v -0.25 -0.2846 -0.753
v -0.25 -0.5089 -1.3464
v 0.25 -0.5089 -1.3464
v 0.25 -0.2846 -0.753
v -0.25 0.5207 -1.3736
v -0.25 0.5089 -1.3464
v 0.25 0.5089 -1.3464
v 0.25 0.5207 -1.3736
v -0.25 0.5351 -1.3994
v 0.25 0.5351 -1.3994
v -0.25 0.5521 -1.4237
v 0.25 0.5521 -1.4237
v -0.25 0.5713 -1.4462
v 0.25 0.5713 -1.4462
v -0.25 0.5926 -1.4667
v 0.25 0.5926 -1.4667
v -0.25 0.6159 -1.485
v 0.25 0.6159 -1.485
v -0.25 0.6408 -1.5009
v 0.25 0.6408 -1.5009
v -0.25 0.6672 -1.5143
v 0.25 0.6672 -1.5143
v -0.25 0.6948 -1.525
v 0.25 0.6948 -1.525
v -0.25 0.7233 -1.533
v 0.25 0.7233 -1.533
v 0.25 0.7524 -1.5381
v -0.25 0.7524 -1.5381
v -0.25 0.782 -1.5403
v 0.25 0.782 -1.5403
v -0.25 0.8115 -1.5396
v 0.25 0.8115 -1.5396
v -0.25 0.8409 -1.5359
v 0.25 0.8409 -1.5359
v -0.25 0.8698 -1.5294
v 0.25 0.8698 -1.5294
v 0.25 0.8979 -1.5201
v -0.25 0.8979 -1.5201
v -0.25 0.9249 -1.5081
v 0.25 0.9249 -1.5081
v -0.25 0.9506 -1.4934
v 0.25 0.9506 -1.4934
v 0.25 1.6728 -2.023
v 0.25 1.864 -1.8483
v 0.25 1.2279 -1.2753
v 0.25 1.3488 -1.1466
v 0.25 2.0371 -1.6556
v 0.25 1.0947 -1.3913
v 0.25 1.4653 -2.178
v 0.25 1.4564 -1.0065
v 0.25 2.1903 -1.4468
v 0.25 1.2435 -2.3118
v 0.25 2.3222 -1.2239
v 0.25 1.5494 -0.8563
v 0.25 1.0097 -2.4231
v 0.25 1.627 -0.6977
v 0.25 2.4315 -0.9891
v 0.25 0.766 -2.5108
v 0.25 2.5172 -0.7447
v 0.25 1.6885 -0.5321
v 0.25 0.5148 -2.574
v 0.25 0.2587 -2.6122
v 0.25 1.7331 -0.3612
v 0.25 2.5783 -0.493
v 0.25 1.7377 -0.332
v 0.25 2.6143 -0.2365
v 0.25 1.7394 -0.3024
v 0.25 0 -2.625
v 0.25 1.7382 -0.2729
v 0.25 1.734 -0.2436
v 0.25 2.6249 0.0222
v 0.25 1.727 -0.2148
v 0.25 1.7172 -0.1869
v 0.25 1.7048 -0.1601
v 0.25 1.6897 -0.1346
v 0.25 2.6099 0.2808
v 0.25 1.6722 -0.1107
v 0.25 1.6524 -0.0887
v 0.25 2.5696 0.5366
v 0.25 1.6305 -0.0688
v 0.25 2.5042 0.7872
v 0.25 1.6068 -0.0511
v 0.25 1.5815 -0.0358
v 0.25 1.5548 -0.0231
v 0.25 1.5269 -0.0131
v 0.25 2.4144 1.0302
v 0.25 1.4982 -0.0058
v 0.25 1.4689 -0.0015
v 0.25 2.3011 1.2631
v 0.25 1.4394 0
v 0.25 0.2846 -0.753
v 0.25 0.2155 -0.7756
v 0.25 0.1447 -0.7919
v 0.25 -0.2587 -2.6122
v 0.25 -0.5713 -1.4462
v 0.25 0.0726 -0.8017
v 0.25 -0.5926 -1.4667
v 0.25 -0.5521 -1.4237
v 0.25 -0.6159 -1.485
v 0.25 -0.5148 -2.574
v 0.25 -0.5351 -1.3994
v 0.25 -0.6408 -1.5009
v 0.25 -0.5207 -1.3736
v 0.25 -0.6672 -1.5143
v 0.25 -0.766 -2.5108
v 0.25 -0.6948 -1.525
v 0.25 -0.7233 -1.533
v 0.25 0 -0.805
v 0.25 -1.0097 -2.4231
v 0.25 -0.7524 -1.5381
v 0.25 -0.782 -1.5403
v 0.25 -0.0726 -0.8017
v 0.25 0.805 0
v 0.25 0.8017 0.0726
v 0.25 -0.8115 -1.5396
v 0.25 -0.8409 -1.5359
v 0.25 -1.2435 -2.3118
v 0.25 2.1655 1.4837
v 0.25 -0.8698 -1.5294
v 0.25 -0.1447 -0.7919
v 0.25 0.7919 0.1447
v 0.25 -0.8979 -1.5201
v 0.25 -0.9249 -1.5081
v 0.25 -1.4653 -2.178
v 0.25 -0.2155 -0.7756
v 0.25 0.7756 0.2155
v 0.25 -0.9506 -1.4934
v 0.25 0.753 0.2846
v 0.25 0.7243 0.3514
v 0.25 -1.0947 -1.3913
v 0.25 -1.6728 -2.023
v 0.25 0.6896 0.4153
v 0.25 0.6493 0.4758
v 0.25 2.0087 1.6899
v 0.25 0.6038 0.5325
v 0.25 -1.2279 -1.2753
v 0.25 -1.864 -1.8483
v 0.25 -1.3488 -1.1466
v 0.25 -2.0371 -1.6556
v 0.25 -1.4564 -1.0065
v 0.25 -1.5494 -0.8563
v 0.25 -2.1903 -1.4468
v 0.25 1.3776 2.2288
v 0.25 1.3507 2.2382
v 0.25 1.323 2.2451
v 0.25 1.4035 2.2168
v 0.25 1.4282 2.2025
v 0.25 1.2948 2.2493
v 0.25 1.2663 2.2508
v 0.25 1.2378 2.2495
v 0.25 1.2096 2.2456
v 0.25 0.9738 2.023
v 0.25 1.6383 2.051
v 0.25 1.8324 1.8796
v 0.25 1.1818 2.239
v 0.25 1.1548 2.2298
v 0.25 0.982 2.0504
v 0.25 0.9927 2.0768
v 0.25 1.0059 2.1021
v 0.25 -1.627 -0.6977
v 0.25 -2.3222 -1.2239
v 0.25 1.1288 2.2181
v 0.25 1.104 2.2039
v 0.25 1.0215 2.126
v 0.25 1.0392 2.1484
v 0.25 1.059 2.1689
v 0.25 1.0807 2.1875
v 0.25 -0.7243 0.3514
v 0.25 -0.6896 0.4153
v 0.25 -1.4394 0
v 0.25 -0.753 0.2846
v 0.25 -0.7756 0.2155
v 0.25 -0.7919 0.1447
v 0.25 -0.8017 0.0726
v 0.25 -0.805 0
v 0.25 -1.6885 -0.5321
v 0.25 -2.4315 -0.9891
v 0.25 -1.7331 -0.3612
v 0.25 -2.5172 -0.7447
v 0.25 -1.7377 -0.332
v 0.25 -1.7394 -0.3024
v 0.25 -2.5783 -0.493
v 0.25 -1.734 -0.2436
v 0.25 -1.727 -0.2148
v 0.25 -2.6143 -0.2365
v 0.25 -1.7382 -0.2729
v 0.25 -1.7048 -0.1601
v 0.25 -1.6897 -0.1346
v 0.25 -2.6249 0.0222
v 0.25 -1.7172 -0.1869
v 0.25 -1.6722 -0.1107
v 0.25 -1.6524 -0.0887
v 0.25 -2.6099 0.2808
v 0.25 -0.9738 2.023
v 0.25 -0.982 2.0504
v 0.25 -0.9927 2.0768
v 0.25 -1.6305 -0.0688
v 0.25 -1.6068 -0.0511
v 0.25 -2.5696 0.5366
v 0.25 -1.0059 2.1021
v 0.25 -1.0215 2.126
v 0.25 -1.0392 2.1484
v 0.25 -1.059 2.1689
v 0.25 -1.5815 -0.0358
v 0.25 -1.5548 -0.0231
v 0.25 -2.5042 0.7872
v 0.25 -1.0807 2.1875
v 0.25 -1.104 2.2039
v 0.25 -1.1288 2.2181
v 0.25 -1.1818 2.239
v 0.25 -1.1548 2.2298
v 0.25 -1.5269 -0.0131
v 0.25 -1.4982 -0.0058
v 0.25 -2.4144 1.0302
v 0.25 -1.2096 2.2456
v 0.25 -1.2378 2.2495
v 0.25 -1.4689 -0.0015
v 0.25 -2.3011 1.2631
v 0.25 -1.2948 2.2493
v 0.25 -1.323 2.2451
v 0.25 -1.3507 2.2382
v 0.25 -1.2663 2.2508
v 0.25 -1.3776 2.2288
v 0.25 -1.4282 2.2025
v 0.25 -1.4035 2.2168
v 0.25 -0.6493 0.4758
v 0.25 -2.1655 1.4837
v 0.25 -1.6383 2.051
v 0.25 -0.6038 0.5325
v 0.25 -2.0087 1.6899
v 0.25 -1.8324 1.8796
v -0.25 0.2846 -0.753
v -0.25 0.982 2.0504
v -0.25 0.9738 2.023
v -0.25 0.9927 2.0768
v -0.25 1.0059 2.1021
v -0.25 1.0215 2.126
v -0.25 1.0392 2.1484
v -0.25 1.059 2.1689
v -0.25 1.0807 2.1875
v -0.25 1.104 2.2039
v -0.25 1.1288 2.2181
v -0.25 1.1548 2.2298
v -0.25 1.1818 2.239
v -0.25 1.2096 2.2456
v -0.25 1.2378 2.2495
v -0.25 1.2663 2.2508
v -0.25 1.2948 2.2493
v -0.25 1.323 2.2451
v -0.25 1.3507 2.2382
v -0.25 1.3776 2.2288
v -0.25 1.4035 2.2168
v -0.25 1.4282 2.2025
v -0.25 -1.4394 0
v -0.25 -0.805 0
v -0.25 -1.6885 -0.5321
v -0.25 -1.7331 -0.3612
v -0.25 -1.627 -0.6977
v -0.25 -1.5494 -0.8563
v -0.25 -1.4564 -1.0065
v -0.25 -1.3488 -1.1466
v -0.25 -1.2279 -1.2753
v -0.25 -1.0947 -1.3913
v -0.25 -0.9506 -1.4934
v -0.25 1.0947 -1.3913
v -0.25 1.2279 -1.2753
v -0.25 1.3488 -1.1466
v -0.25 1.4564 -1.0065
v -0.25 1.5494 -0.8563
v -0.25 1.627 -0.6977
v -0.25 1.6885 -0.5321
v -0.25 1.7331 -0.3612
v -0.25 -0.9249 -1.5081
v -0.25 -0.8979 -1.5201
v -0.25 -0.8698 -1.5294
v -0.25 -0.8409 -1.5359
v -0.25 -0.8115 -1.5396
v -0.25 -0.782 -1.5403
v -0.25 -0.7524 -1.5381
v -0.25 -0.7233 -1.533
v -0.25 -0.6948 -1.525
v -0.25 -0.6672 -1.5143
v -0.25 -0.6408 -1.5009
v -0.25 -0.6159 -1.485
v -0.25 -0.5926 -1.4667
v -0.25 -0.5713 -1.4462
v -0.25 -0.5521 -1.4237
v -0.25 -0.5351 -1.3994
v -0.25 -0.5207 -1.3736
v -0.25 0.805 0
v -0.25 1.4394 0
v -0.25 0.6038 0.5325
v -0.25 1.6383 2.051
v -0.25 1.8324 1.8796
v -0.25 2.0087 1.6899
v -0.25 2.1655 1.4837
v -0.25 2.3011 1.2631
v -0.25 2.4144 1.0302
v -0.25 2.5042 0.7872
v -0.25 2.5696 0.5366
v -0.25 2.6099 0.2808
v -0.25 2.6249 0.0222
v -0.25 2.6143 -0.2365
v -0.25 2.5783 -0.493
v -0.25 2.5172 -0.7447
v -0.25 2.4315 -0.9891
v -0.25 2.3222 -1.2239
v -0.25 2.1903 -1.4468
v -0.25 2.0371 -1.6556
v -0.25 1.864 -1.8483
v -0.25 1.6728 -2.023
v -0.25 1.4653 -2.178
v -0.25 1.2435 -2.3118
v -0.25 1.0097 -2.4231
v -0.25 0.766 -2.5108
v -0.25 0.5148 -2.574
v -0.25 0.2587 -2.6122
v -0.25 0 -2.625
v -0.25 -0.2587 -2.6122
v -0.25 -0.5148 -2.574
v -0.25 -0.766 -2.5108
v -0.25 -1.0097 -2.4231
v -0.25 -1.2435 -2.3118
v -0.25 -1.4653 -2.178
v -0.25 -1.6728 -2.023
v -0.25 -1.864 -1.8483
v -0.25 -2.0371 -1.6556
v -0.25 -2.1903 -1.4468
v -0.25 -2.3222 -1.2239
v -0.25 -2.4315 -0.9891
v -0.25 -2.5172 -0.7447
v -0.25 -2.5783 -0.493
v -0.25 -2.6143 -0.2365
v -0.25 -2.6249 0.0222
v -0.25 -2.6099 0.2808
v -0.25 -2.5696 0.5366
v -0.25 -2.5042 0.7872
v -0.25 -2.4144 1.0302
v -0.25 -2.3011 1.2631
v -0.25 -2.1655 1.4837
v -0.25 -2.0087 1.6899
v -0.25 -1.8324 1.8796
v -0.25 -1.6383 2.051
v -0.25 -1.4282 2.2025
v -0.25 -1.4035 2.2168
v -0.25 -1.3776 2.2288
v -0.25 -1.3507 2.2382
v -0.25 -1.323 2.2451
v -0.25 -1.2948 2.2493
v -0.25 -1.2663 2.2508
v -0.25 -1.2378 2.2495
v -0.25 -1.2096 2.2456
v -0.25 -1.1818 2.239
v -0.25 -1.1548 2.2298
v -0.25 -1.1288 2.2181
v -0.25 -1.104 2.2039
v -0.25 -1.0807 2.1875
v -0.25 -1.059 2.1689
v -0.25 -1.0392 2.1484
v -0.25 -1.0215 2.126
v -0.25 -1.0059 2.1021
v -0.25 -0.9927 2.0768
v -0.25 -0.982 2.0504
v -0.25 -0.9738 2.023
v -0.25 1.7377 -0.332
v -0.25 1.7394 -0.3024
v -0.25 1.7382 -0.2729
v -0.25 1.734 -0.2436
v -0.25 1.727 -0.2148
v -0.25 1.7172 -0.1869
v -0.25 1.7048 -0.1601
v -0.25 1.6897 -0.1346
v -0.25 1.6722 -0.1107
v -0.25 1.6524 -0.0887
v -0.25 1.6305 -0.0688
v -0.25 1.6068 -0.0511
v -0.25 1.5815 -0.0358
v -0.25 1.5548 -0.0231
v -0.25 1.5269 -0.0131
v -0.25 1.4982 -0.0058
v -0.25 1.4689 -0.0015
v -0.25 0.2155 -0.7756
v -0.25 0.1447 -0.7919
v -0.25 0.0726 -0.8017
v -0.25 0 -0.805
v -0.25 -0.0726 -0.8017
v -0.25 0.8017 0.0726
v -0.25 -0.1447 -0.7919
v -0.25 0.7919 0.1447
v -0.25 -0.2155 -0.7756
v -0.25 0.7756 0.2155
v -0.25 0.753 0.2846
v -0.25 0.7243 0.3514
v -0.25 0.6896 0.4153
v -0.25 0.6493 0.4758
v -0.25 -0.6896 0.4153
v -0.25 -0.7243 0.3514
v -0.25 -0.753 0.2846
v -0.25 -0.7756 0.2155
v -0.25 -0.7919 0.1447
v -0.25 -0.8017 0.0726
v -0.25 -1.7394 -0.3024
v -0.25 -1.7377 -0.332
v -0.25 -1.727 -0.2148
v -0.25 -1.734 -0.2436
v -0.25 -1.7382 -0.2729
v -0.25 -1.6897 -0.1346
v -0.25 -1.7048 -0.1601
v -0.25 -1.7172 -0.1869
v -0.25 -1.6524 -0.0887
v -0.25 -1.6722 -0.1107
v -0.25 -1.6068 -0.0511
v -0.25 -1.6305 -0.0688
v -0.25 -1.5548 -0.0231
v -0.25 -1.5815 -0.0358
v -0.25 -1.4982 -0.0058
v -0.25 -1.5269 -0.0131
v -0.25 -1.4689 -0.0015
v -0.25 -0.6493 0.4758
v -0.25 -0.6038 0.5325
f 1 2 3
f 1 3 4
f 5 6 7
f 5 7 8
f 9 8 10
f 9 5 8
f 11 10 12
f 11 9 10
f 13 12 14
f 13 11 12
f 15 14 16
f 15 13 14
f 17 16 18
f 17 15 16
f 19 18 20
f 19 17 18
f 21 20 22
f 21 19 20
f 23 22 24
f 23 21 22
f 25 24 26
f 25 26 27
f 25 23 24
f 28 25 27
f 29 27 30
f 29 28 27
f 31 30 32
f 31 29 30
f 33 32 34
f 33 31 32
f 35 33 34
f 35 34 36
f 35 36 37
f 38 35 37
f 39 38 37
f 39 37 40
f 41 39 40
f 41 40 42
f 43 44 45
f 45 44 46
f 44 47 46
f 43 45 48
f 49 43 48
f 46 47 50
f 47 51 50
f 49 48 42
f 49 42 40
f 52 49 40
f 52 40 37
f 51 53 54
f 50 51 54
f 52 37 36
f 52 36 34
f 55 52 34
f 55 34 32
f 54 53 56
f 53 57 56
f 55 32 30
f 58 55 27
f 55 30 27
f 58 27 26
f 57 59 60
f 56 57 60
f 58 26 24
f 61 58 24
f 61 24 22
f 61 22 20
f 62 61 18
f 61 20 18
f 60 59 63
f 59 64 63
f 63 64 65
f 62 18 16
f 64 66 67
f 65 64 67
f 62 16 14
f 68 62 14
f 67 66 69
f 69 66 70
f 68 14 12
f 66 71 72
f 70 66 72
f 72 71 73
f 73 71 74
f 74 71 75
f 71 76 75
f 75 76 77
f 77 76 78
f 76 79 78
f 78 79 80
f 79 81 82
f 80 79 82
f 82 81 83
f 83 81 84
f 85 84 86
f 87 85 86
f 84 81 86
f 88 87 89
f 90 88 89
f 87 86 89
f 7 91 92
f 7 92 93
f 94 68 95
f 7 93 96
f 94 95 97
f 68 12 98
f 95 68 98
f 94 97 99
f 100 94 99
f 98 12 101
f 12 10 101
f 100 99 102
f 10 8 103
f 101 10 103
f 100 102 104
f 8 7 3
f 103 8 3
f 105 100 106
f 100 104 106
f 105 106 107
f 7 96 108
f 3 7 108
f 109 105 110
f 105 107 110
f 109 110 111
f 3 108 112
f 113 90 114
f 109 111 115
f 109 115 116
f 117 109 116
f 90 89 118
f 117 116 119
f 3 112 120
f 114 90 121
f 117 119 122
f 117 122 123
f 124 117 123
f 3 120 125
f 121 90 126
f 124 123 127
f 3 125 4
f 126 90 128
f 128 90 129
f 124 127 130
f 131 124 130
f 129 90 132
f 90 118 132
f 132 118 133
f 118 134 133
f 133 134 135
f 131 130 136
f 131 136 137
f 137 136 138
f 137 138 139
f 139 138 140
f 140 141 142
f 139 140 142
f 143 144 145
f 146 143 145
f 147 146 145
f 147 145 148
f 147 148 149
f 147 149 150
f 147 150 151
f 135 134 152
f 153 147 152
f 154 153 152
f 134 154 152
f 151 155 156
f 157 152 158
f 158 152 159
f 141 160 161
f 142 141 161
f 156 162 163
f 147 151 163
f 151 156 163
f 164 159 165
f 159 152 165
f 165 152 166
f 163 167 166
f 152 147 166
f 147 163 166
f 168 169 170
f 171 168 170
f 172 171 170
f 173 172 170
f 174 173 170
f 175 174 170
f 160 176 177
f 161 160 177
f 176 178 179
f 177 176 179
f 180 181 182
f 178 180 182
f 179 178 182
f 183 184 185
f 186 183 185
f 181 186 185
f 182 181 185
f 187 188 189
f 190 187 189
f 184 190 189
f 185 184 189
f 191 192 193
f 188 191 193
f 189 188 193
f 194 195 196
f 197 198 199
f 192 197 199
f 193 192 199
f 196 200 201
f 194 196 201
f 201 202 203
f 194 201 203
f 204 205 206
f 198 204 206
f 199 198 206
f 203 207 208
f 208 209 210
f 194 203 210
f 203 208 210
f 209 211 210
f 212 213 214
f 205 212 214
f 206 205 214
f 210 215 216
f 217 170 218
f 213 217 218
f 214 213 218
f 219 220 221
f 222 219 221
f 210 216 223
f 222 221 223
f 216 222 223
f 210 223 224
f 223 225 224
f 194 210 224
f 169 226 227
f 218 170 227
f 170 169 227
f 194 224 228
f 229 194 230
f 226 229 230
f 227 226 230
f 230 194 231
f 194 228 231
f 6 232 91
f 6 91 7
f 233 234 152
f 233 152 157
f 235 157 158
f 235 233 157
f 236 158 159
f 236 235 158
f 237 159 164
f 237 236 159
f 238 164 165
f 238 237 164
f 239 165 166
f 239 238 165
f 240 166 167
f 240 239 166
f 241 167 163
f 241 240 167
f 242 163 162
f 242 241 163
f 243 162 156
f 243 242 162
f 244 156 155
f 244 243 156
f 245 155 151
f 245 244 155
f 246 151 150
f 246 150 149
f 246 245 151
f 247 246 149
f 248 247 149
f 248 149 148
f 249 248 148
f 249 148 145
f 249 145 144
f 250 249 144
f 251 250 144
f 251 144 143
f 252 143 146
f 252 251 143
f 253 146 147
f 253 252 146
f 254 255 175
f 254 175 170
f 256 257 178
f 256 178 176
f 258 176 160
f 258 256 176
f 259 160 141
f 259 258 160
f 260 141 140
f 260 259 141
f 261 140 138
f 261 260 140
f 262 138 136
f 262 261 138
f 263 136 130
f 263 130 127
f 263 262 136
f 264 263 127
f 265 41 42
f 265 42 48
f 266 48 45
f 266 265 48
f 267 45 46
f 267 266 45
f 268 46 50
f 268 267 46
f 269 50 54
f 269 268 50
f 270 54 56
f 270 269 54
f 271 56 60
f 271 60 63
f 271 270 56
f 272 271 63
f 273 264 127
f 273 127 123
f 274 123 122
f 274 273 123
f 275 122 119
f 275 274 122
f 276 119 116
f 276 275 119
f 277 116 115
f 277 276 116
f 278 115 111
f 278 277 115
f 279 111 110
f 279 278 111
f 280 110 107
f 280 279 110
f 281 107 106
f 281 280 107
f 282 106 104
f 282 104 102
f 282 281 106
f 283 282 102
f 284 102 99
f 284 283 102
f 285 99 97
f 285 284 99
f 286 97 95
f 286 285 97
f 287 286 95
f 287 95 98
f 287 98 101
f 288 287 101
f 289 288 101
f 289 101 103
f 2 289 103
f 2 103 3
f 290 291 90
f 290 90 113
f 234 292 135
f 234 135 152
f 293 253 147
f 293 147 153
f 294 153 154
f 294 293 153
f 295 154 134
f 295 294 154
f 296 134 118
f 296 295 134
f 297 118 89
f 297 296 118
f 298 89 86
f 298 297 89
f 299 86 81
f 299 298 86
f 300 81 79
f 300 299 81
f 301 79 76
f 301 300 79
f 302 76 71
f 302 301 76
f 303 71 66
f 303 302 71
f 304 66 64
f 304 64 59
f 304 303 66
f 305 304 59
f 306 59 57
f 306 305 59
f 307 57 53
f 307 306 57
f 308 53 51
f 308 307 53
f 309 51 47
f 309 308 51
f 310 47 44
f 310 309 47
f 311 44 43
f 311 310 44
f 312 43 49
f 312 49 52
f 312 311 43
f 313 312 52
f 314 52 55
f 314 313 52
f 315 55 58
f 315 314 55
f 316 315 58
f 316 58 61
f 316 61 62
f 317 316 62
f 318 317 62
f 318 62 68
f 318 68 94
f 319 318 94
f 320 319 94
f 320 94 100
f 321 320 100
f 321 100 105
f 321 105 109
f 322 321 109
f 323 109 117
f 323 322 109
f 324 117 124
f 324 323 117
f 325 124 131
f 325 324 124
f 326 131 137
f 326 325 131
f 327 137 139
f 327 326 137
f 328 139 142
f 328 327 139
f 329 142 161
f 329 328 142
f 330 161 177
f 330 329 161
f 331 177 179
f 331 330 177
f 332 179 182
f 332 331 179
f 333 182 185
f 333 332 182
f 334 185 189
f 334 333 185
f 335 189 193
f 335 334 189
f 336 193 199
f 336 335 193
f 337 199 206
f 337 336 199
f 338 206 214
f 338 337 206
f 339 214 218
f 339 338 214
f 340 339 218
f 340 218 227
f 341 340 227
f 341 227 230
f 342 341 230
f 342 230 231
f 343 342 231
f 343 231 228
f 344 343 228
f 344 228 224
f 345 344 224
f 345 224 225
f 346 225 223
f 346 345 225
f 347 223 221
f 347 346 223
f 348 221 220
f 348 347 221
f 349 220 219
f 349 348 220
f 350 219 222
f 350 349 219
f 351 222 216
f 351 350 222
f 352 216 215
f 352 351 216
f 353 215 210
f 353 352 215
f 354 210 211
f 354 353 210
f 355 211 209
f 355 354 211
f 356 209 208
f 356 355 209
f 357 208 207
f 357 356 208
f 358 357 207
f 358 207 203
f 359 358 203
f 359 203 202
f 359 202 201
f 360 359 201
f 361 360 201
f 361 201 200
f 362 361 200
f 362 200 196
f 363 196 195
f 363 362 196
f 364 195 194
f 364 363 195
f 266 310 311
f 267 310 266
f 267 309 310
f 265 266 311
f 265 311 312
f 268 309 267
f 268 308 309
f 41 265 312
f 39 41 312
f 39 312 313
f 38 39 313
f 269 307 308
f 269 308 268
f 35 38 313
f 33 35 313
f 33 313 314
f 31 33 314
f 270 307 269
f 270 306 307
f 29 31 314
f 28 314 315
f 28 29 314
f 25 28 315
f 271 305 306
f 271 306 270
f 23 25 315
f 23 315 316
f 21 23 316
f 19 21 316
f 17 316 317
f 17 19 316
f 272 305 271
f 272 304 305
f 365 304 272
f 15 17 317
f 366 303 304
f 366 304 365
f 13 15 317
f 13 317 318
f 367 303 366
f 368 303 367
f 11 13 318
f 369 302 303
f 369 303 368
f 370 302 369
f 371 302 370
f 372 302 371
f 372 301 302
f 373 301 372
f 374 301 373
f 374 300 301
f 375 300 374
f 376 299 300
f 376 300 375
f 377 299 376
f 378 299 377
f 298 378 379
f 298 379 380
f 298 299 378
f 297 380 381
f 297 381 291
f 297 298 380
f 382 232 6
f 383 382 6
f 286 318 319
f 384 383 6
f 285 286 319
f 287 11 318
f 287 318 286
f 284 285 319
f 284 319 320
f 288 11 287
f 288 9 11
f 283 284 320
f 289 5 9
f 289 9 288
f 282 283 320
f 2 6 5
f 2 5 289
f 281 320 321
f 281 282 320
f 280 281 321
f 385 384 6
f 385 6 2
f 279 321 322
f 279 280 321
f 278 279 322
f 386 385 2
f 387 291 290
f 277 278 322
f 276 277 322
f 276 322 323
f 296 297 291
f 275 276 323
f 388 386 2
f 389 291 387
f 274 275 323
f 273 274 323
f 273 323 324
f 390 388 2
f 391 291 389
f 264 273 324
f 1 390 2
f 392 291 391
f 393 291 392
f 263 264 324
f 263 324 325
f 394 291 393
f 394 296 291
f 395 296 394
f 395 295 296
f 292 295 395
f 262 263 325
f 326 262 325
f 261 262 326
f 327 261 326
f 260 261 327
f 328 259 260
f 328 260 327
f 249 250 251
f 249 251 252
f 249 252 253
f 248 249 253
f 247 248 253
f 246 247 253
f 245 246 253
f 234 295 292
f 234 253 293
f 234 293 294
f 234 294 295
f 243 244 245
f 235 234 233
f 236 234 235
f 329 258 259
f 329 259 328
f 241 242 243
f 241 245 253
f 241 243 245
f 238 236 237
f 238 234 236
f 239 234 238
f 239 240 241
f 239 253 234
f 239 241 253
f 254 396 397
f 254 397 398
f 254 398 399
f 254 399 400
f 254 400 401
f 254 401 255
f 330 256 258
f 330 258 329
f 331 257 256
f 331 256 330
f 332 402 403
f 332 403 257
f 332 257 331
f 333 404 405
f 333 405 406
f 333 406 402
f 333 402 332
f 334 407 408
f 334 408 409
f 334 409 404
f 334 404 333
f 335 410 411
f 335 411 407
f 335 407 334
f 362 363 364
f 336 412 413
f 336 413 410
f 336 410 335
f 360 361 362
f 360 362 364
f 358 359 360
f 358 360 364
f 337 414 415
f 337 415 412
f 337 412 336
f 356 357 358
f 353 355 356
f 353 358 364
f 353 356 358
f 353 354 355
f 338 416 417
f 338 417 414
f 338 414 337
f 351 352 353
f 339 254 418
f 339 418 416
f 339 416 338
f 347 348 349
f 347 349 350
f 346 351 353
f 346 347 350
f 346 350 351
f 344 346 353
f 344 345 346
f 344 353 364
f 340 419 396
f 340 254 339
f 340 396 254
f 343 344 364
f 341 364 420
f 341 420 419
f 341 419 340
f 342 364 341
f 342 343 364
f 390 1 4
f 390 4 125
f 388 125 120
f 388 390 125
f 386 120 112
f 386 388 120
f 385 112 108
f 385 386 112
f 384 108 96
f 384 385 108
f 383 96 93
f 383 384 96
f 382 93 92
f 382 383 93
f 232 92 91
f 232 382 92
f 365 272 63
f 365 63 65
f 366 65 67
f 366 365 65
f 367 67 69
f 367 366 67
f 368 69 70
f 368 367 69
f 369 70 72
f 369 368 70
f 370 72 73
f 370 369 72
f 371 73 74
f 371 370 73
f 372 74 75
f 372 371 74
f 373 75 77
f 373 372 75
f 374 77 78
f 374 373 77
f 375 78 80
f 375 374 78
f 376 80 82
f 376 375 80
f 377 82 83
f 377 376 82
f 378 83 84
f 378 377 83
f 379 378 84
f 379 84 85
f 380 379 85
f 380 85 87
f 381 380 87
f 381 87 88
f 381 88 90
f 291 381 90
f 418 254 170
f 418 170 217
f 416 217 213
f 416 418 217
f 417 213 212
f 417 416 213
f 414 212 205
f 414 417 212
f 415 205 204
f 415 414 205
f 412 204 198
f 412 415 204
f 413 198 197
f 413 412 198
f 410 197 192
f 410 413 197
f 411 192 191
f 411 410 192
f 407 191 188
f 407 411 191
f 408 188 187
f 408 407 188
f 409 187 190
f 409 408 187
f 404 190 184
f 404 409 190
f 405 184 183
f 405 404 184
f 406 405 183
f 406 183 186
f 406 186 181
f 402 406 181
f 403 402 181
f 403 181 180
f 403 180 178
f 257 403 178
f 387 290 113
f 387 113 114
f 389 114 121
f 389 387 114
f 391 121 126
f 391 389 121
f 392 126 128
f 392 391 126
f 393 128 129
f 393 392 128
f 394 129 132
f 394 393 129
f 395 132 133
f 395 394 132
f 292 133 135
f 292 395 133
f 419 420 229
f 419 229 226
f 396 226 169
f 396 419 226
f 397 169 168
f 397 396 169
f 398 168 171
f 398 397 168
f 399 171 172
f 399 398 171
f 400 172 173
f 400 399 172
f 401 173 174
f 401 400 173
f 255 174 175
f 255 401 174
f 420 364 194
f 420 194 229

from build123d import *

# Parameters (mm, degrees)
BOSS_EXTRUDE1_DEPTH = 0.5


with BuildPart() as part:
    # Sketch1 → Boss-Extrude1 (new body)
    with BuildSketch(Plane(origin=(-0.25, 0, 0), x_dir=(0, -1, 0), z_dir=(-1, 0, 0))):
        with BuildLine():
            Line((0.973814574, 2.023045102), (0.60375, 0.532457451))
            ThreePointArc((0.60375, 0.532457451), (0.753008549, 0.284610479), (0.805, 0))
            Line((0.805, 0), (1.439391709, 0))
            ThreePointArc((1.439391709, 0), (1.672161248, -0.110742658), (1.733080671, -0.361211057))
            ThreePointArc((1.733080671, -0.361211057), (1.456381342, -1.006476738), (0.950618553, -1.493441129))
            ThreePointArc((0.950618553, -1.493441129), (0.69478855, -1.525010179), (0.508901819, -1.346427655))
            Line((0.508901819, -1.346427655), (0.284610479, -0.753008549))
            ThreePointArc((0.284610479, -0.753008549), (0, -0.805), (-0.284610479, -0.753008549))
            Line((-0.284610479, -0.753008549), (-0.508901819, -1.346427655))
            ThreePointArc((-0.508901819, -1.346427655), (-0.69478855, -1.525010179), (-0.950618553, -1.493441129))
            ThreePointArc((-0.950618553, -1.493441129), (-1.456381342, -1.006476738), (-1.733080671, -0.361211057))
            ThreePointArc((-1.733080671, -0.361211057), (-1.672161248, -0.110742658), (-1.439391709, 0))
            Line((-1.439391709, 0), (-0.805, 0))
            ThreePointArc((-0.805, 0), (-0.753008549, 0.284610479), (-0.60375, 0.532457451))
            Line((-0.60375, 0.532457451), (-0.973814574, 2.023045102))
            ThreePointArc((-0.973814574, 2.023045102), (-1.154792173, 2.2297926), (-1.428198284, 2.202470127))
            ThreePointArc((-1.428198284, 2.202470127), (0, -2.625), (1.428198284, 2.202470127))
            ThreePointArc((1.428198284, 2.202470127), (1.154792173, 2.2297926), (0.973814574, 2.023045102))
        make_face()
    extrude(amount=-BOSS_EXTRUDE1_DEPTH)


solid = part.part
